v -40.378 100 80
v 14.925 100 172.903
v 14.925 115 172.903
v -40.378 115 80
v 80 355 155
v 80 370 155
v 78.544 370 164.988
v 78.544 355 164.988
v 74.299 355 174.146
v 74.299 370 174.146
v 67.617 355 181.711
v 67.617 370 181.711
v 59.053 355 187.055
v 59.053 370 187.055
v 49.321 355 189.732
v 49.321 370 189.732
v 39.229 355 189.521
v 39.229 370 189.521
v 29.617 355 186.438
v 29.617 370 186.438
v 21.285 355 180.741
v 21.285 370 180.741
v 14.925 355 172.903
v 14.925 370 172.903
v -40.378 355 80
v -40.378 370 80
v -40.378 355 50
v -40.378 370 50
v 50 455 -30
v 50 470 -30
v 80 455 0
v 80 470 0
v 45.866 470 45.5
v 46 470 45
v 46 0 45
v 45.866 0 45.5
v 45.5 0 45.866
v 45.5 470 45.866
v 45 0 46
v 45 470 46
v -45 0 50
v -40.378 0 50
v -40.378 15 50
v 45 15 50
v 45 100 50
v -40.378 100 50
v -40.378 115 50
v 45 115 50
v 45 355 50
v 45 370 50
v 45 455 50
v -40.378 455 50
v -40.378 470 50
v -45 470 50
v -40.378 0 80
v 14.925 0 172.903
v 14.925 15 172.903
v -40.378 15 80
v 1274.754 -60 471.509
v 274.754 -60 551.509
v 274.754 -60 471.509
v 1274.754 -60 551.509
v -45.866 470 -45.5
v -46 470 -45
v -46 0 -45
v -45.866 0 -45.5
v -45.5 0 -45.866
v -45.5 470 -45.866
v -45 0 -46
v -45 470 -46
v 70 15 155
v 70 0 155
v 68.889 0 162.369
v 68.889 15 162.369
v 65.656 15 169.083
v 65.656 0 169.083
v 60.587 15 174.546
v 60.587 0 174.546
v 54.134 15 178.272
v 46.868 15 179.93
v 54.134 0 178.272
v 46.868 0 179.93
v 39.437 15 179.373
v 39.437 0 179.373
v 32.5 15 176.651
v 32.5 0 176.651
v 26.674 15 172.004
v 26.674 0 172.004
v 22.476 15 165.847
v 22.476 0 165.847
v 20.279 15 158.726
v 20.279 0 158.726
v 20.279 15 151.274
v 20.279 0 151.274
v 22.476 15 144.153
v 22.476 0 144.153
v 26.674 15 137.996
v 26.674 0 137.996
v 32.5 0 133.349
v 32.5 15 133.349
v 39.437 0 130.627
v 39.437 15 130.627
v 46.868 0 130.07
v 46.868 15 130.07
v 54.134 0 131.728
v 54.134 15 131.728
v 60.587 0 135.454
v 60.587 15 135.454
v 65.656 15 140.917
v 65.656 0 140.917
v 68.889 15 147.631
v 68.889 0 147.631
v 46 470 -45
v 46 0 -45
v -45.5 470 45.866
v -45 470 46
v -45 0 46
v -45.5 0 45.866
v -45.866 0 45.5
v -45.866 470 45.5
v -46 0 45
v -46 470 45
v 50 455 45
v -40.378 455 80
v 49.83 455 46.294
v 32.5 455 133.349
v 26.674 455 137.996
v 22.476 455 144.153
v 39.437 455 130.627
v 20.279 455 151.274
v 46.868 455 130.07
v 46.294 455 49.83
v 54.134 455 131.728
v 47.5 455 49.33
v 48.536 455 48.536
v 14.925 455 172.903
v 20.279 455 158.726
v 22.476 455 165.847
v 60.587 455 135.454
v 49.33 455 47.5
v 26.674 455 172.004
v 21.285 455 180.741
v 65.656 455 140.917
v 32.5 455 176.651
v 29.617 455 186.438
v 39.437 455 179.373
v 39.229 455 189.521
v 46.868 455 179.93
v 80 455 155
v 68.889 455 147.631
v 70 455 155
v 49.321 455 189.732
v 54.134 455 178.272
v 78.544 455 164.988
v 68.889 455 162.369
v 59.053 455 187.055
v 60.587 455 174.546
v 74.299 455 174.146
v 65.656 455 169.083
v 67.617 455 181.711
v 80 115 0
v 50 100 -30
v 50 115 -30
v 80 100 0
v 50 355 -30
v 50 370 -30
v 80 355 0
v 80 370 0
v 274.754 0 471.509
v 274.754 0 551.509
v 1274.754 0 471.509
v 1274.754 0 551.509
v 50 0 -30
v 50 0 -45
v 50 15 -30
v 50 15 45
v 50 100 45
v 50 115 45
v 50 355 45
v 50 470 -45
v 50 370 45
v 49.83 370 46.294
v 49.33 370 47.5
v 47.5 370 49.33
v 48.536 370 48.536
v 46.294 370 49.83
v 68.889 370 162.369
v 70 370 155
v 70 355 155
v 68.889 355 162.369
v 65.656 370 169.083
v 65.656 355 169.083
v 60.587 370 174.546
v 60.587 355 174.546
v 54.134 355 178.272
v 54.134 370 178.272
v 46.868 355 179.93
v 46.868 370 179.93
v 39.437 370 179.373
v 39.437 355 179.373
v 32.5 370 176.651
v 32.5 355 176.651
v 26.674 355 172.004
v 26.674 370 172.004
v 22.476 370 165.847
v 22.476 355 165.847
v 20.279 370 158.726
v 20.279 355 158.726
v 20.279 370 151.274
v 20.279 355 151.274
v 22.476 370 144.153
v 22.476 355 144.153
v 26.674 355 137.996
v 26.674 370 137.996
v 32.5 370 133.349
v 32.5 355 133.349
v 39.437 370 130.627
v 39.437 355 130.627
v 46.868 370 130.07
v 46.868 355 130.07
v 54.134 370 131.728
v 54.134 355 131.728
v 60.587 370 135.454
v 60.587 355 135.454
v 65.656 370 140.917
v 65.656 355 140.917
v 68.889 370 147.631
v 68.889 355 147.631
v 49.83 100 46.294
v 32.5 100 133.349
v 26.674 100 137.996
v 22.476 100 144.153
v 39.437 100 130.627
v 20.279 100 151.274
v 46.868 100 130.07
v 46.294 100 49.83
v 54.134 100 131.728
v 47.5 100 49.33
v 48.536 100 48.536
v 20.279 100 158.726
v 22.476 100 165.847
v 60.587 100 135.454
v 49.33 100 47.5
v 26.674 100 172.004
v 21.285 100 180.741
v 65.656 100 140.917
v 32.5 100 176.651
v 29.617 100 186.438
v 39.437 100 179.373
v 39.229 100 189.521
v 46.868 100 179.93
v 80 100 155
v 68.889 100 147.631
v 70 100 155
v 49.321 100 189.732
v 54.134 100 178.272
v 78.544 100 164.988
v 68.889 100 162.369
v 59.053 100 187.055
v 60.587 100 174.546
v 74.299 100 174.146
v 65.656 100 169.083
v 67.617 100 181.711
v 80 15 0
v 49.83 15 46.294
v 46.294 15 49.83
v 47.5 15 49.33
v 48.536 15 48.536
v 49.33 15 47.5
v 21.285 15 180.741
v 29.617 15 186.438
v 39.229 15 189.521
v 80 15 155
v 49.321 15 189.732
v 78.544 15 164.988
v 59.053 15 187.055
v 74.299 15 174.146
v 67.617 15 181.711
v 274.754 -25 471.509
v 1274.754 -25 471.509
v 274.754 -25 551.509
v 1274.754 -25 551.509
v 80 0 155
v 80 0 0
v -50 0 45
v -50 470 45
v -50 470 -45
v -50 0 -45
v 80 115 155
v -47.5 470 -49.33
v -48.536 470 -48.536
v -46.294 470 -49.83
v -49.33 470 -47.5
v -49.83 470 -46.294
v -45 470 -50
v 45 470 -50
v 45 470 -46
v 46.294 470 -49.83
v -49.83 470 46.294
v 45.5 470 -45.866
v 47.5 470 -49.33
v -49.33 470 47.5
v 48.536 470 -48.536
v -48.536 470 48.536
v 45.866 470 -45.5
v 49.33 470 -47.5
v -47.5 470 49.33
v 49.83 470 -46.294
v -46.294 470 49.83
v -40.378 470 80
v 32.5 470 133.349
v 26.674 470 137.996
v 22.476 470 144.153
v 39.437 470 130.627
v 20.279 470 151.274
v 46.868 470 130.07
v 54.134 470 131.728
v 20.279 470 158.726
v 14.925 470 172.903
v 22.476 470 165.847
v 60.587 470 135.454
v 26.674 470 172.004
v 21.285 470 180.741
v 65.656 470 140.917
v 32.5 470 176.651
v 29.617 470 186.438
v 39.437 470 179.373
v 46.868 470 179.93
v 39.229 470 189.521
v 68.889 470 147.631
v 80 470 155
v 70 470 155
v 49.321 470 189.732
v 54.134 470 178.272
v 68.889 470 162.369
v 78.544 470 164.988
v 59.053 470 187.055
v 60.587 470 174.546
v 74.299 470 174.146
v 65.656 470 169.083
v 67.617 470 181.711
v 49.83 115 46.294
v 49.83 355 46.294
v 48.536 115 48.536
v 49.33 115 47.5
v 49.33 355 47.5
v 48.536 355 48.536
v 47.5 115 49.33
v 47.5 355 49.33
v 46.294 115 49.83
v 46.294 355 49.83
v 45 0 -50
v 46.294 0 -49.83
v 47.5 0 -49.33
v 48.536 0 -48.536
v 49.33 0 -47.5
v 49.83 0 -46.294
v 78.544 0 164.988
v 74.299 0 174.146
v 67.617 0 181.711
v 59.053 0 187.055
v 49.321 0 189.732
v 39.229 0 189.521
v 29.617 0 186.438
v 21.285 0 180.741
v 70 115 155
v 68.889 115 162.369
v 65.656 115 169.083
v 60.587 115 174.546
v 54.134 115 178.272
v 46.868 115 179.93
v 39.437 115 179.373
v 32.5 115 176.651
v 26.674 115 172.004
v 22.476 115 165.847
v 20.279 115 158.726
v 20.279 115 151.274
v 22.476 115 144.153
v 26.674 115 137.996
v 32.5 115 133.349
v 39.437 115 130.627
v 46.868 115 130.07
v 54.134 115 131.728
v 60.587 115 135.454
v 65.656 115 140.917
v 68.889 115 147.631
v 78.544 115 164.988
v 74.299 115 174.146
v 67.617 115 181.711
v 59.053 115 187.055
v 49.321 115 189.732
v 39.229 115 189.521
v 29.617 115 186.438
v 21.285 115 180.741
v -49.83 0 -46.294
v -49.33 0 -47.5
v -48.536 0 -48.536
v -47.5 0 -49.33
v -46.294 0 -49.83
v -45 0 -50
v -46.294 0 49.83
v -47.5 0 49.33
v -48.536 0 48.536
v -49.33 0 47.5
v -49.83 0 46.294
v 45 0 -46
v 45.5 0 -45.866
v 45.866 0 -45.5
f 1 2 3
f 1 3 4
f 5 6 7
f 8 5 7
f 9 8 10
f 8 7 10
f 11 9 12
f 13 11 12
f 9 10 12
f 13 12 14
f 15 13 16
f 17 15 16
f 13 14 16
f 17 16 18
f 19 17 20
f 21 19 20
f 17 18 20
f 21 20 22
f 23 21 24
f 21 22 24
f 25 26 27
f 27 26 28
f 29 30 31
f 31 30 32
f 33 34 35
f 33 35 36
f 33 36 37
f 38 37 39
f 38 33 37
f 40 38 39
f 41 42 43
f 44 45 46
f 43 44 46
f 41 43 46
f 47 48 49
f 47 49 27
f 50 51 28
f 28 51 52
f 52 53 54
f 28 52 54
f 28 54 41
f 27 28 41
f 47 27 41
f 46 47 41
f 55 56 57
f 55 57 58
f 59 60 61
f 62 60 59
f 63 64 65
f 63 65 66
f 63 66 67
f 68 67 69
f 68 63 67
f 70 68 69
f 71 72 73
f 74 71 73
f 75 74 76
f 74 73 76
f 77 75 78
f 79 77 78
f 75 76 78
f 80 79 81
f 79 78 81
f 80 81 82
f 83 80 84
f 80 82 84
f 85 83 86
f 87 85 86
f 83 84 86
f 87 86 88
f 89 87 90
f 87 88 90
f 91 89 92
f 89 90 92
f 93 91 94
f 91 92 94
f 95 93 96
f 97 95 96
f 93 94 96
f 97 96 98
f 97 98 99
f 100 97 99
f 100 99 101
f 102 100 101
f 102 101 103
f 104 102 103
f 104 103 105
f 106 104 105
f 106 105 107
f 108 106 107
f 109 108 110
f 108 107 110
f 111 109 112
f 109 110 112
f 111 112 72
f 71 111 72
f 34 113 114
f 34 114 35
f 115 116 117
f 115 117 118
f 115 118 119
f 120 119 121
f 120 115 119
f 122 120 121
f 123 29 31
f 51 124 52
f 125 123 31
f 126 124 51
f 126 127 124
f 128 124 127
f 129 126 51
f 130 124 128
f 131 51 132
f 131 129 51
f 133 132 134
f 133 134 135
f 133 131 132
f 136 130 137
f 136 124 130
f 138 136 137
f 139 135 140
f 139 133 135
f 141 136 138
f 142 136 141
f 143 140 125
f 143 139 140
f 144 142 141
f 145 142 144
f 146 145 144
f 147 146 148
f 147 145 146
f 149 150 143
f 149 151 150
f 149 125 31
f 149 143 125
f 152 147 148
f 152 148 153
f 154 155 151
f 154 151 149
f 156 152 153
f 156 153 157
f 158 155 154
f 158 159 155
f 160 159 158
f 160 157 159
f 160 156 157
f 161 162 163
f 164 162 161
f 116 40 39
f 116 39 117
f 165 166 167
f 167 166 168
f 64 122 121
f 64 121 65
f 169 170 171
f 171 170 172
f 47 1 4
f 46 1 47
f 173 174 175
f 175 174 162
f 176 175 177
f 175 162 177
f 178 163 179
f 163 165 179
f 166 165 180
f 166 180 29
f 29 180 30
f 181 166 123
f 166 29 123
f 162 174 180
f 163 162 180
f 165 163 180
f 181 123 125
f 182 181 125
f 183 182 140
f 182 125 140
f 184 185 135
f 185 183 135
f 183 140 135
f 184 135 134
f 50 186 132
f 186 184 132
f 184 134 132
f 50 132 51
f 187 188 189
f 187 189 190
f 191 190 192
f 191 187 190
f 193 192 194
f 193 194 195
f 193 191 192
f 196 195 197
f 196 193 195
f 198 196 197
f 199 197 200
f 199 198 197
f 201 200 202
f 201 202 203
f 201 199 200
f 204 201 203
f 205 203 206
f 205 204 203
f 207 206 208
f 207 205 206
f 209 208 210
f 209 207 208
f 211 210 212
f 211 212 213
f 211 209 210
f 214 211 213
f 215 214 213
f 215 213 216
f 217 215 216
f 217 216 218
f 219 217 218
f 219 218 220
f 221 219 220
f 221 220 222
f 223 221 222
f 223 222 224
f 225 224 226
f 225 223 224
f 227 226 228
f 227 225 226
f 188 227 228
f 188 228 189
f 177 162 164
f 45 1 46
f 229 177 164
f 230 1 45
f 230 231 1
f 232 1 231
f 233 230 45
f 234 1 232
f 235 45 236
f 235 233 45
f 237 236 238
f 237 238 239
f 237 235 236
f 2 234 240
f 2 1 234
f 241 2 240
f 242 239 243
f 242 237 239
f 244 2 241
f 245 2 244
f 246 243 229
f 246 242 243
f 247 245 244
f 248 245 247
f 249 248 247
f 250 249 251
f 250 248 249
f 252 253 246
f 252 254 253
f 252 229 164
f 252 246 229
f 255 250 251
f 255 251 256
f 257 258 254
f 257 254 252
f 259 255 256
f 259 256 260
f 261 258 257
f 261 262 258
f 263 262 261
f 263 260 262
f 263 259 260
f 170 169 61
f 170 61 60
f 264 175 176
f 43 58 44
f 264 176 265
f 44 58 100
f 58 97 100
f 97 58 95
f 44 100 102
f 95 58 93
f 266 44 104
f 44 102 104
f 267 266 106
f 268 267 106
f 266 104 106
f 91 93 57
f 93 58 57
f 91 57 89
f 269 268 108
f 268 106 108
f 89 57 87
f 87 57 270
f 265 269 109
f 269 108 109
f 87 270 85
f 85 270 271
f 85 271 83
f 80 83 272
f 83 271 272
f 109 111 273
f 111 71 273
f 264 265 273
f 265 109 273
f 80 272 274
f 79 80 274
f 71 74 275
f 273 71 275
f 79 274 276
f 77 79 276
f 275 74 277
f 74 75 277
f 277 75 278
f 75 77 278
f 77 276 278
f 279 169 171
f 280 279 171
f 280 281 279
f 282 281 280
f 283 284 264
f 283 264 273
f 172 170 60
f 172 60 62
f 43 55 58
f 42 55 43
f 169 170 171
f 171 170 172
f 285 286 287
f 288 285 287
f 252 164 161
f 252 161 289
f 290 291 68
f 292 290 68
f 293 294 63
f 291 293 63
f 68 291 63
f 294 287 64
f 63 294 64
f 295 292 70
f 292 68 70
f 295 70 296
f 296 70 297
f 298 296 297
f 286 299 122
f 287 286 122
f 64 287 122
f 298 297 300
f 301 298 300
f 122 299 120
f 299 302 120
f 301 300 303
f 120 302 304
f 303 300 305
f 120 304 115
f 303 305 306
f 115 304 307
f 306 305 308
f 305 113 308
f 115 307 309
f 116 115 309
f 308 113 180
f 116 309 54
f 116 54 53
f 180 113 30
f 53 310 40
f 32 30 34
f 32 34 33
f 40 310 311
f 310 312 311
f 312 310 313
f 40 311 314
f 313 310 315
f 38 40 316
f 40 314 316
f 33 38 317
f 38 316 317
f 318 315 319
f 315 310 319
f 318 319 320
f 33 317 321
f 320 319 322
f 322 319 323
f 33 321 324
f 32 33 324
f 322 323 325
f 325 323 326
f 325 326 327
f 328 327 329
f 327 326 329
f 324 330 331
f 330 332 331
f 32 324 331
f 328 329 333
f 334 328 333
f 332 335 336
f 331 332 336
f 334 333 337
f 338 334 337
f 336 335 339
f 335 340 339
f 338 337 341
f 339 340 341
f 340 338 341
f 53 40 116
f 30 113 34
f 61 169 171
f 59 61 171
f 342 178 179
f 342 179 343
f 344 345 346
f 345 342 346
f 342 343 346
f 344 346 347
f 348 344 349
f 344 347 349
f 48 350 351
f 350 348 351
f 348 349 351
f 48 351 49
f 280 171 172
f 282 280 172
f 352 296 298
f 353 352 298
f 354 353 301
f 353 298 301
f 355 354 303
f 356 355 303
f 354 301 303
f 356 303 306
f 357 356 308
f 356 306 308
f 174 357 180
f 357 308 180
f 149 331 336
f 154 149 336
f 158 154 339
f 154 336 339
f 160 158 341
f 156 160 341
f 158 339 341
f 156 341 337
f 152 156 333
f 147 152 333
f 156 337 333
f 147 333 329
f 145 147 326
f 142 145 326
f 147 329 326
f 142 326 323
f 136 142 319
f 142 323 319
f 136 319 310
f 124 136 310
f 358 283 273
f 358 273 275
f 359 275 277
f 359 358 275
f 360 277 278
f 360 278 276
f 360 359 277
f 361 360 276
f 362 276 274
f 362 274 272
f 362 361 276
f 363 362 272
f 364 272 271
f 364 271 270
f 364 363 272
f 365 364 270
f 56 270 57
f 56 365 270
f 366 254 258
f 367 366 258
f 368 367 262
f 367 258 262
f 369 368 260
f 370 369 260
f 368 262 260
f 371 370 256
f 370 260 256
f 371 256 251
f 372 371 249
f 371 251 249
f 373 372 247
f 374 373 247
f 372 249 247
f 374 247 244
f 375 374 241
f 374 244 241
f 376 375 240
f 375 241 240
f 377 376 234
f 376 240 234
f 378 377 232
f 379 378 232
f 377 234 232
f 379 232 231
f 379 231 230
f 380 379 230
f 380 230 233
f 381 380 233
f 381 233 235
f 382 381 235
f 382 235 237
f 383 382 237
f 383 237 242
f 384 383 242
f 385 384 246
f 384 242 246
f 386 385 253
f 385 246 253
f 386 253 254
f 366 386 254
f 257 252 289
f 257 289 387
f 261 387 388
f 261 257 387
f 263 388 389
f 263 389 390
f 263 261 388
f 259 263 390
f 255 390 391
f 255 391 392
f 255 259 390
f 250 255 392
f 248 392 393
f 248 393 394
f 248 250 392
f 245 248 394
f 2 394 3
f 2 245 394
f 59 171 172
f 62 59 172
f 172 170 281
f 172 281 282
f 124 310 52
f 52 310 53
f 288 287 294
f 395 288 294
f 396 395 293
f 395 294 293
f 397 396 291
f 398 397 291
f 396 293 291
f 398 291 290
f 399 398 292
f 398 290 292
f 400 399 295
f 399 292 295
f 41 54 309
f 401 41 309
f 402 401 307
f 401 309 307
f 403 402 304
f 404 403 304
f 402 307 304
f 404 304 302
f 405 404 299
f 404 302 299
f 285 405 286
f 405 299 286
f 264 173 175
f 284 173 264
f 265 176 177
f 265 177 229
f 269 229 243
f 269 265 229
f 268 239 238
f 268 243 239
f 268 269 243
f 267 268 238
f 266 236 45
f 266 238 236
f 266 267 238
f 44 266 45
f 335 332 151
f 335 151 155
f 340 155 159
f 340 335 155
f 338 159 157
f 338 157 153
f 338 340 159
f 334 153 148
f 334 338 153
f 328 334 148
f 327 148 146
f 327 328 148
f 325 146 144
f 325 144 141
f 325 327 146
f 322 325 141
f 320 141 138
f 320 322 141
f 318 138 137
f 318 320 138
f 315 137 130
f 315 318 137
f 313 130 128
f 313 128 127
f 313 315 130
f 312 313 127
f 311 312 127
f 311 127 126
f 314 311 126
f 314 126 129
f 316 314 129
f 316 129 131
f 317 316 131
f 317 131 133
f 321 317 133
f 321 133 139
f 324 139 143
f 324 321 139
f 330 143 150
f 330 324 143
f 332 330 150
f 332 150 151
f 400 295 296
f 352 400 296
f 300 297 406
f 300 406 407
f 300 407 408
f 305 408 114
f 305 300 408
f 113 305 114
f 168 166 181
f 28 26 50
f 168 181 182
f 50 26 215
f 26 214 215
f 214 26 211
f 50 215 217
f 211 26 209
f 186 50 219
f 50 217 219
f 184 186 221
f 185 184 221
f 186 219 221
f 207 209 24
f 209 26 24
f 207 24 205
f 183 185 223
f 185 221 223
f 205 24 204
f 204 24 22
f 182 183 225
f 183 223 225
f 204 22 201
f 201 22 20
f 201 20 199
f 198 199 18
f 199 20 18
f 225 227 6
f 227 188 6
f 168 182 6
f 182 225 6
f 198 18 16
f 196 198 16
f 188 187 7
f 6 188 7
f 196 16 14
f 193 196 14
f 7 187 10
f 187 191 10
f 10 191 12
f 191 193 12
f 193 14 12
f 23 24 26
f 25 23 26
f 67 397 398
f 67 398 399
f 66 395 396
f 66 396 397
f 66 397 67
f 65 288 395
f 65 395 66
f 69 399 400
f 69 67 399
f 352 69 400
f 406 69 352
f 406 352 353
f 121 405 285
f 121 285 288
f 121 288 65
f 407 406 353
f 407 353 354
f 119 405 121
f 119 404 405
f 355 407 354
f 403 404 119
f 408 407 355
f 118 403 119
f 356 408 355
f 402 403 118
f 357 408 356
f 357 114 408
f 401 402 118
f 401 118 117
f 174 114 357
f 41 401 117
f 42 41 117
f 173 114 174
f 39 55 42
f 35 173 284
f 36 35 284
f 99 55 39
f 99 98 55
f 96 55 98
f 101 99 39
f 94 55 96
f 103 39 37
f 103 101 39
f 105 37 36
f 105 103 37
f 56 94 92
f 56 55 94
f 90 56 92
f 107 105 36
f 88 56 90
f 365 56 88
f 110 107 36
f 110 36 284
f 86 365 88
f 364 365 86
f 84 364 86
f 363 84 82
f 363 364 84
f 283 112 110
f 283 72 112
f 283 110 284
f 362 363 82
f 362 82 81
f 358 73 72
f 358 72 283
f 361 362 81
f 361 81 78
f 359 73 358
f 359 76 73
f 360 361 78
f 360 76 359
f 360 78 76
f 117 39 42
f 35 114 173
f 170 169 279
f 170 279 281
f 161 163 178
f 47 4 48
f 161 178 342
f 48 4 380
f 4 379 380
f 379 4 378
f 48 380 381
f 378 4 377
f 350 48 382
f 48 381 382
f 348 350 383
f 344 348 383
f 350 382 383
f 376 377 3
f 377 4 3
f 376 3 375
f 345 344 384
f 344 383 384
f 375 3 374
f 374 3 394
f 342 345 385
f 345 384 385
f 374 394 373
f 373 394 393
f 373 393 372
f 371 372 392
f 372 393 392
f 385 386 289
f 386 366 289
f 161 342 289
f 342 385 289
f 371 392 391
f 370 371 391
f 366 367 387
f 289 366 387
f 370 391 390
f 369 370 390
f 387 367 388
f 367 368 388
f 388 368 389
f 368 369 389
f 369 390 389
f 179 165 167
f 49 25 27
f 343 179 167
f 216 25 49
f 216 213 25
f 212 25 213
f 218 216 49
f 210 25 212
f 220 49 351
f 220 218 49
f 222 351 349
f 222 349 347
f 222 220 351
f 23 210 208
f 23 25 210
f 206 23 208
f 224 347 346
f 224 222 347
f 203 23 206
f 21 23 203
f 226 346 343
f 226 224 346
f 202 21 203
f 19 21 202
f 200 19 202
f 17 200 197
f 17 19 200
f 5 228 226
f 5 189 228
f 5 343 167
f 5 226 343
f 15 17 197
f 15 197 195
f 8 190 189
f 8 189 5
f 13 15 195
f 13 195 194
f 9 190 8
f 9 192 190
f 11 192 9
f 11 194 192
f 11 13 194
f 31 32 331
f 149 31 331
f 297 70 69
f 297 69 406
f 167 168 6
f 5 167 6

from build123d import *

# Parameters (mm, degrees)
F1_DEPTH = 235
F2_T     = -4
F0_R     = 25
F3_DEPTH = 15
F0_W     = 1000
F0_H     = 80
F6_DEPTH = 60
F7_DEPTH = 25


with BuildPart() as f1:
    # F0 (on Front) → F1 (new body)
    with BuildSketch(Plane.XZ):
        with BuildLine():
            ThreePointArc((50, 45), (48.5355339059, 48.5355339059), (45, 50))
            Line((45, 50), (-40.3777472675, 50))
            Line((-40.3777472675, 50), (-45, 50))
            ThreePointArc((-45, 50), (-48.5355339059, 48.5355339059), (-50, 45))
            Line((-50, 45), (-50, -45))
            ThreePointArc((-50, -45), (-48.5355339059, -48.5355339059), (-45, -50))
            Line((-45, -50), (45, -50))
            ThreePointArc((45, -50), (48.5355339059, -48.5355339059), (50, -45))
            Line((50, -45), (50, -30))
            Line((50, -30), (50, 45))
        make_face()
    extrude(amount=-F1_DEPTH)

    # F2
    f2_openings = [f1.faces().sort_by_distance(p)[0] for p in [
        (0, 0, 0),
        (0, 235, 0),
    ]]
    offset(amount=F2_T, openings=f2_openings)



with BuildPart() as f3:
    # F0 (on Front) → F3 (new body)
    with BuildSketch(Plane.XZ):
        with BuildLine():
            Line((-40.3777472675, 50), (45, 50))
            ThreePointArc((45, 50), (48.5355339059, 48.5355339059), (50, 45))
            Line((50, 45), (50, -30))
            Line((50, -30), (80, 0))
            Line((80, 0), (80, 155))
            ThreePointArc((80, 155), (54.2839853809, 188.7462237213), (14.9252791173, 172.9028255822))
            Line((14.9252791173, 172.9028255822), (-40.3777472675, 80))
            Line((-40.3777472675, 80), (-40.3777472675, 50))
        make_face()
        with Locations((45, 155)):
            Circle(F0_R, mode=Mode.SUBTRACT)
    extrude(amount=-F3_DEPTH)


with BuildPart() as f4_1:
    # F4: copy of F3
    add(f3.part.moved(Location((0, 100, 0))))


with BuildPart() as f1_1:
    add(f1.part)

    add(f3.part)  # F5 merges F3

    add(f4_1.part)  # F5 merges F4_1
    # F5: F1, F3, F4_1 across face
    add(f1.part.mirror(Plane(origin=(0, 235, 0), x_dir=(1, 0, 0), z_dir=(0, 1, 0))))
    add(f3.part.mirror(Plane(origin=(0, 235, 0), x_dir=(1, 0, 0), z_dir=(0, 1, 0))))
    add(f4_1.part.mirror(Plane(origin=(0, 235, 0), x_dir=(1, 0, 0), z_dir=(0, 1, 0))))


with BuildPart() as f6:
    # F0 (on Front) → F6 (new body)
    with BuildSketch(Plane.XZ):
        with Locations((774.7542262077, 511.5091586113)):
            Rectangle(F0_W, F0_H)
    extrude(amount=F6_DEPTH)


with BuildPart() as f7:
    # F0 (on Front) → F7 (new body)
    with BuildSketch(Plane.XZ):
        with Locations((774.7542262077, 511.5091586113)):
            Rectangle(F0_W, F0_H)
    extrude(amount=F7_DEPTH)


solid = Compound([f1_1.part, f6.part, f7.part])
